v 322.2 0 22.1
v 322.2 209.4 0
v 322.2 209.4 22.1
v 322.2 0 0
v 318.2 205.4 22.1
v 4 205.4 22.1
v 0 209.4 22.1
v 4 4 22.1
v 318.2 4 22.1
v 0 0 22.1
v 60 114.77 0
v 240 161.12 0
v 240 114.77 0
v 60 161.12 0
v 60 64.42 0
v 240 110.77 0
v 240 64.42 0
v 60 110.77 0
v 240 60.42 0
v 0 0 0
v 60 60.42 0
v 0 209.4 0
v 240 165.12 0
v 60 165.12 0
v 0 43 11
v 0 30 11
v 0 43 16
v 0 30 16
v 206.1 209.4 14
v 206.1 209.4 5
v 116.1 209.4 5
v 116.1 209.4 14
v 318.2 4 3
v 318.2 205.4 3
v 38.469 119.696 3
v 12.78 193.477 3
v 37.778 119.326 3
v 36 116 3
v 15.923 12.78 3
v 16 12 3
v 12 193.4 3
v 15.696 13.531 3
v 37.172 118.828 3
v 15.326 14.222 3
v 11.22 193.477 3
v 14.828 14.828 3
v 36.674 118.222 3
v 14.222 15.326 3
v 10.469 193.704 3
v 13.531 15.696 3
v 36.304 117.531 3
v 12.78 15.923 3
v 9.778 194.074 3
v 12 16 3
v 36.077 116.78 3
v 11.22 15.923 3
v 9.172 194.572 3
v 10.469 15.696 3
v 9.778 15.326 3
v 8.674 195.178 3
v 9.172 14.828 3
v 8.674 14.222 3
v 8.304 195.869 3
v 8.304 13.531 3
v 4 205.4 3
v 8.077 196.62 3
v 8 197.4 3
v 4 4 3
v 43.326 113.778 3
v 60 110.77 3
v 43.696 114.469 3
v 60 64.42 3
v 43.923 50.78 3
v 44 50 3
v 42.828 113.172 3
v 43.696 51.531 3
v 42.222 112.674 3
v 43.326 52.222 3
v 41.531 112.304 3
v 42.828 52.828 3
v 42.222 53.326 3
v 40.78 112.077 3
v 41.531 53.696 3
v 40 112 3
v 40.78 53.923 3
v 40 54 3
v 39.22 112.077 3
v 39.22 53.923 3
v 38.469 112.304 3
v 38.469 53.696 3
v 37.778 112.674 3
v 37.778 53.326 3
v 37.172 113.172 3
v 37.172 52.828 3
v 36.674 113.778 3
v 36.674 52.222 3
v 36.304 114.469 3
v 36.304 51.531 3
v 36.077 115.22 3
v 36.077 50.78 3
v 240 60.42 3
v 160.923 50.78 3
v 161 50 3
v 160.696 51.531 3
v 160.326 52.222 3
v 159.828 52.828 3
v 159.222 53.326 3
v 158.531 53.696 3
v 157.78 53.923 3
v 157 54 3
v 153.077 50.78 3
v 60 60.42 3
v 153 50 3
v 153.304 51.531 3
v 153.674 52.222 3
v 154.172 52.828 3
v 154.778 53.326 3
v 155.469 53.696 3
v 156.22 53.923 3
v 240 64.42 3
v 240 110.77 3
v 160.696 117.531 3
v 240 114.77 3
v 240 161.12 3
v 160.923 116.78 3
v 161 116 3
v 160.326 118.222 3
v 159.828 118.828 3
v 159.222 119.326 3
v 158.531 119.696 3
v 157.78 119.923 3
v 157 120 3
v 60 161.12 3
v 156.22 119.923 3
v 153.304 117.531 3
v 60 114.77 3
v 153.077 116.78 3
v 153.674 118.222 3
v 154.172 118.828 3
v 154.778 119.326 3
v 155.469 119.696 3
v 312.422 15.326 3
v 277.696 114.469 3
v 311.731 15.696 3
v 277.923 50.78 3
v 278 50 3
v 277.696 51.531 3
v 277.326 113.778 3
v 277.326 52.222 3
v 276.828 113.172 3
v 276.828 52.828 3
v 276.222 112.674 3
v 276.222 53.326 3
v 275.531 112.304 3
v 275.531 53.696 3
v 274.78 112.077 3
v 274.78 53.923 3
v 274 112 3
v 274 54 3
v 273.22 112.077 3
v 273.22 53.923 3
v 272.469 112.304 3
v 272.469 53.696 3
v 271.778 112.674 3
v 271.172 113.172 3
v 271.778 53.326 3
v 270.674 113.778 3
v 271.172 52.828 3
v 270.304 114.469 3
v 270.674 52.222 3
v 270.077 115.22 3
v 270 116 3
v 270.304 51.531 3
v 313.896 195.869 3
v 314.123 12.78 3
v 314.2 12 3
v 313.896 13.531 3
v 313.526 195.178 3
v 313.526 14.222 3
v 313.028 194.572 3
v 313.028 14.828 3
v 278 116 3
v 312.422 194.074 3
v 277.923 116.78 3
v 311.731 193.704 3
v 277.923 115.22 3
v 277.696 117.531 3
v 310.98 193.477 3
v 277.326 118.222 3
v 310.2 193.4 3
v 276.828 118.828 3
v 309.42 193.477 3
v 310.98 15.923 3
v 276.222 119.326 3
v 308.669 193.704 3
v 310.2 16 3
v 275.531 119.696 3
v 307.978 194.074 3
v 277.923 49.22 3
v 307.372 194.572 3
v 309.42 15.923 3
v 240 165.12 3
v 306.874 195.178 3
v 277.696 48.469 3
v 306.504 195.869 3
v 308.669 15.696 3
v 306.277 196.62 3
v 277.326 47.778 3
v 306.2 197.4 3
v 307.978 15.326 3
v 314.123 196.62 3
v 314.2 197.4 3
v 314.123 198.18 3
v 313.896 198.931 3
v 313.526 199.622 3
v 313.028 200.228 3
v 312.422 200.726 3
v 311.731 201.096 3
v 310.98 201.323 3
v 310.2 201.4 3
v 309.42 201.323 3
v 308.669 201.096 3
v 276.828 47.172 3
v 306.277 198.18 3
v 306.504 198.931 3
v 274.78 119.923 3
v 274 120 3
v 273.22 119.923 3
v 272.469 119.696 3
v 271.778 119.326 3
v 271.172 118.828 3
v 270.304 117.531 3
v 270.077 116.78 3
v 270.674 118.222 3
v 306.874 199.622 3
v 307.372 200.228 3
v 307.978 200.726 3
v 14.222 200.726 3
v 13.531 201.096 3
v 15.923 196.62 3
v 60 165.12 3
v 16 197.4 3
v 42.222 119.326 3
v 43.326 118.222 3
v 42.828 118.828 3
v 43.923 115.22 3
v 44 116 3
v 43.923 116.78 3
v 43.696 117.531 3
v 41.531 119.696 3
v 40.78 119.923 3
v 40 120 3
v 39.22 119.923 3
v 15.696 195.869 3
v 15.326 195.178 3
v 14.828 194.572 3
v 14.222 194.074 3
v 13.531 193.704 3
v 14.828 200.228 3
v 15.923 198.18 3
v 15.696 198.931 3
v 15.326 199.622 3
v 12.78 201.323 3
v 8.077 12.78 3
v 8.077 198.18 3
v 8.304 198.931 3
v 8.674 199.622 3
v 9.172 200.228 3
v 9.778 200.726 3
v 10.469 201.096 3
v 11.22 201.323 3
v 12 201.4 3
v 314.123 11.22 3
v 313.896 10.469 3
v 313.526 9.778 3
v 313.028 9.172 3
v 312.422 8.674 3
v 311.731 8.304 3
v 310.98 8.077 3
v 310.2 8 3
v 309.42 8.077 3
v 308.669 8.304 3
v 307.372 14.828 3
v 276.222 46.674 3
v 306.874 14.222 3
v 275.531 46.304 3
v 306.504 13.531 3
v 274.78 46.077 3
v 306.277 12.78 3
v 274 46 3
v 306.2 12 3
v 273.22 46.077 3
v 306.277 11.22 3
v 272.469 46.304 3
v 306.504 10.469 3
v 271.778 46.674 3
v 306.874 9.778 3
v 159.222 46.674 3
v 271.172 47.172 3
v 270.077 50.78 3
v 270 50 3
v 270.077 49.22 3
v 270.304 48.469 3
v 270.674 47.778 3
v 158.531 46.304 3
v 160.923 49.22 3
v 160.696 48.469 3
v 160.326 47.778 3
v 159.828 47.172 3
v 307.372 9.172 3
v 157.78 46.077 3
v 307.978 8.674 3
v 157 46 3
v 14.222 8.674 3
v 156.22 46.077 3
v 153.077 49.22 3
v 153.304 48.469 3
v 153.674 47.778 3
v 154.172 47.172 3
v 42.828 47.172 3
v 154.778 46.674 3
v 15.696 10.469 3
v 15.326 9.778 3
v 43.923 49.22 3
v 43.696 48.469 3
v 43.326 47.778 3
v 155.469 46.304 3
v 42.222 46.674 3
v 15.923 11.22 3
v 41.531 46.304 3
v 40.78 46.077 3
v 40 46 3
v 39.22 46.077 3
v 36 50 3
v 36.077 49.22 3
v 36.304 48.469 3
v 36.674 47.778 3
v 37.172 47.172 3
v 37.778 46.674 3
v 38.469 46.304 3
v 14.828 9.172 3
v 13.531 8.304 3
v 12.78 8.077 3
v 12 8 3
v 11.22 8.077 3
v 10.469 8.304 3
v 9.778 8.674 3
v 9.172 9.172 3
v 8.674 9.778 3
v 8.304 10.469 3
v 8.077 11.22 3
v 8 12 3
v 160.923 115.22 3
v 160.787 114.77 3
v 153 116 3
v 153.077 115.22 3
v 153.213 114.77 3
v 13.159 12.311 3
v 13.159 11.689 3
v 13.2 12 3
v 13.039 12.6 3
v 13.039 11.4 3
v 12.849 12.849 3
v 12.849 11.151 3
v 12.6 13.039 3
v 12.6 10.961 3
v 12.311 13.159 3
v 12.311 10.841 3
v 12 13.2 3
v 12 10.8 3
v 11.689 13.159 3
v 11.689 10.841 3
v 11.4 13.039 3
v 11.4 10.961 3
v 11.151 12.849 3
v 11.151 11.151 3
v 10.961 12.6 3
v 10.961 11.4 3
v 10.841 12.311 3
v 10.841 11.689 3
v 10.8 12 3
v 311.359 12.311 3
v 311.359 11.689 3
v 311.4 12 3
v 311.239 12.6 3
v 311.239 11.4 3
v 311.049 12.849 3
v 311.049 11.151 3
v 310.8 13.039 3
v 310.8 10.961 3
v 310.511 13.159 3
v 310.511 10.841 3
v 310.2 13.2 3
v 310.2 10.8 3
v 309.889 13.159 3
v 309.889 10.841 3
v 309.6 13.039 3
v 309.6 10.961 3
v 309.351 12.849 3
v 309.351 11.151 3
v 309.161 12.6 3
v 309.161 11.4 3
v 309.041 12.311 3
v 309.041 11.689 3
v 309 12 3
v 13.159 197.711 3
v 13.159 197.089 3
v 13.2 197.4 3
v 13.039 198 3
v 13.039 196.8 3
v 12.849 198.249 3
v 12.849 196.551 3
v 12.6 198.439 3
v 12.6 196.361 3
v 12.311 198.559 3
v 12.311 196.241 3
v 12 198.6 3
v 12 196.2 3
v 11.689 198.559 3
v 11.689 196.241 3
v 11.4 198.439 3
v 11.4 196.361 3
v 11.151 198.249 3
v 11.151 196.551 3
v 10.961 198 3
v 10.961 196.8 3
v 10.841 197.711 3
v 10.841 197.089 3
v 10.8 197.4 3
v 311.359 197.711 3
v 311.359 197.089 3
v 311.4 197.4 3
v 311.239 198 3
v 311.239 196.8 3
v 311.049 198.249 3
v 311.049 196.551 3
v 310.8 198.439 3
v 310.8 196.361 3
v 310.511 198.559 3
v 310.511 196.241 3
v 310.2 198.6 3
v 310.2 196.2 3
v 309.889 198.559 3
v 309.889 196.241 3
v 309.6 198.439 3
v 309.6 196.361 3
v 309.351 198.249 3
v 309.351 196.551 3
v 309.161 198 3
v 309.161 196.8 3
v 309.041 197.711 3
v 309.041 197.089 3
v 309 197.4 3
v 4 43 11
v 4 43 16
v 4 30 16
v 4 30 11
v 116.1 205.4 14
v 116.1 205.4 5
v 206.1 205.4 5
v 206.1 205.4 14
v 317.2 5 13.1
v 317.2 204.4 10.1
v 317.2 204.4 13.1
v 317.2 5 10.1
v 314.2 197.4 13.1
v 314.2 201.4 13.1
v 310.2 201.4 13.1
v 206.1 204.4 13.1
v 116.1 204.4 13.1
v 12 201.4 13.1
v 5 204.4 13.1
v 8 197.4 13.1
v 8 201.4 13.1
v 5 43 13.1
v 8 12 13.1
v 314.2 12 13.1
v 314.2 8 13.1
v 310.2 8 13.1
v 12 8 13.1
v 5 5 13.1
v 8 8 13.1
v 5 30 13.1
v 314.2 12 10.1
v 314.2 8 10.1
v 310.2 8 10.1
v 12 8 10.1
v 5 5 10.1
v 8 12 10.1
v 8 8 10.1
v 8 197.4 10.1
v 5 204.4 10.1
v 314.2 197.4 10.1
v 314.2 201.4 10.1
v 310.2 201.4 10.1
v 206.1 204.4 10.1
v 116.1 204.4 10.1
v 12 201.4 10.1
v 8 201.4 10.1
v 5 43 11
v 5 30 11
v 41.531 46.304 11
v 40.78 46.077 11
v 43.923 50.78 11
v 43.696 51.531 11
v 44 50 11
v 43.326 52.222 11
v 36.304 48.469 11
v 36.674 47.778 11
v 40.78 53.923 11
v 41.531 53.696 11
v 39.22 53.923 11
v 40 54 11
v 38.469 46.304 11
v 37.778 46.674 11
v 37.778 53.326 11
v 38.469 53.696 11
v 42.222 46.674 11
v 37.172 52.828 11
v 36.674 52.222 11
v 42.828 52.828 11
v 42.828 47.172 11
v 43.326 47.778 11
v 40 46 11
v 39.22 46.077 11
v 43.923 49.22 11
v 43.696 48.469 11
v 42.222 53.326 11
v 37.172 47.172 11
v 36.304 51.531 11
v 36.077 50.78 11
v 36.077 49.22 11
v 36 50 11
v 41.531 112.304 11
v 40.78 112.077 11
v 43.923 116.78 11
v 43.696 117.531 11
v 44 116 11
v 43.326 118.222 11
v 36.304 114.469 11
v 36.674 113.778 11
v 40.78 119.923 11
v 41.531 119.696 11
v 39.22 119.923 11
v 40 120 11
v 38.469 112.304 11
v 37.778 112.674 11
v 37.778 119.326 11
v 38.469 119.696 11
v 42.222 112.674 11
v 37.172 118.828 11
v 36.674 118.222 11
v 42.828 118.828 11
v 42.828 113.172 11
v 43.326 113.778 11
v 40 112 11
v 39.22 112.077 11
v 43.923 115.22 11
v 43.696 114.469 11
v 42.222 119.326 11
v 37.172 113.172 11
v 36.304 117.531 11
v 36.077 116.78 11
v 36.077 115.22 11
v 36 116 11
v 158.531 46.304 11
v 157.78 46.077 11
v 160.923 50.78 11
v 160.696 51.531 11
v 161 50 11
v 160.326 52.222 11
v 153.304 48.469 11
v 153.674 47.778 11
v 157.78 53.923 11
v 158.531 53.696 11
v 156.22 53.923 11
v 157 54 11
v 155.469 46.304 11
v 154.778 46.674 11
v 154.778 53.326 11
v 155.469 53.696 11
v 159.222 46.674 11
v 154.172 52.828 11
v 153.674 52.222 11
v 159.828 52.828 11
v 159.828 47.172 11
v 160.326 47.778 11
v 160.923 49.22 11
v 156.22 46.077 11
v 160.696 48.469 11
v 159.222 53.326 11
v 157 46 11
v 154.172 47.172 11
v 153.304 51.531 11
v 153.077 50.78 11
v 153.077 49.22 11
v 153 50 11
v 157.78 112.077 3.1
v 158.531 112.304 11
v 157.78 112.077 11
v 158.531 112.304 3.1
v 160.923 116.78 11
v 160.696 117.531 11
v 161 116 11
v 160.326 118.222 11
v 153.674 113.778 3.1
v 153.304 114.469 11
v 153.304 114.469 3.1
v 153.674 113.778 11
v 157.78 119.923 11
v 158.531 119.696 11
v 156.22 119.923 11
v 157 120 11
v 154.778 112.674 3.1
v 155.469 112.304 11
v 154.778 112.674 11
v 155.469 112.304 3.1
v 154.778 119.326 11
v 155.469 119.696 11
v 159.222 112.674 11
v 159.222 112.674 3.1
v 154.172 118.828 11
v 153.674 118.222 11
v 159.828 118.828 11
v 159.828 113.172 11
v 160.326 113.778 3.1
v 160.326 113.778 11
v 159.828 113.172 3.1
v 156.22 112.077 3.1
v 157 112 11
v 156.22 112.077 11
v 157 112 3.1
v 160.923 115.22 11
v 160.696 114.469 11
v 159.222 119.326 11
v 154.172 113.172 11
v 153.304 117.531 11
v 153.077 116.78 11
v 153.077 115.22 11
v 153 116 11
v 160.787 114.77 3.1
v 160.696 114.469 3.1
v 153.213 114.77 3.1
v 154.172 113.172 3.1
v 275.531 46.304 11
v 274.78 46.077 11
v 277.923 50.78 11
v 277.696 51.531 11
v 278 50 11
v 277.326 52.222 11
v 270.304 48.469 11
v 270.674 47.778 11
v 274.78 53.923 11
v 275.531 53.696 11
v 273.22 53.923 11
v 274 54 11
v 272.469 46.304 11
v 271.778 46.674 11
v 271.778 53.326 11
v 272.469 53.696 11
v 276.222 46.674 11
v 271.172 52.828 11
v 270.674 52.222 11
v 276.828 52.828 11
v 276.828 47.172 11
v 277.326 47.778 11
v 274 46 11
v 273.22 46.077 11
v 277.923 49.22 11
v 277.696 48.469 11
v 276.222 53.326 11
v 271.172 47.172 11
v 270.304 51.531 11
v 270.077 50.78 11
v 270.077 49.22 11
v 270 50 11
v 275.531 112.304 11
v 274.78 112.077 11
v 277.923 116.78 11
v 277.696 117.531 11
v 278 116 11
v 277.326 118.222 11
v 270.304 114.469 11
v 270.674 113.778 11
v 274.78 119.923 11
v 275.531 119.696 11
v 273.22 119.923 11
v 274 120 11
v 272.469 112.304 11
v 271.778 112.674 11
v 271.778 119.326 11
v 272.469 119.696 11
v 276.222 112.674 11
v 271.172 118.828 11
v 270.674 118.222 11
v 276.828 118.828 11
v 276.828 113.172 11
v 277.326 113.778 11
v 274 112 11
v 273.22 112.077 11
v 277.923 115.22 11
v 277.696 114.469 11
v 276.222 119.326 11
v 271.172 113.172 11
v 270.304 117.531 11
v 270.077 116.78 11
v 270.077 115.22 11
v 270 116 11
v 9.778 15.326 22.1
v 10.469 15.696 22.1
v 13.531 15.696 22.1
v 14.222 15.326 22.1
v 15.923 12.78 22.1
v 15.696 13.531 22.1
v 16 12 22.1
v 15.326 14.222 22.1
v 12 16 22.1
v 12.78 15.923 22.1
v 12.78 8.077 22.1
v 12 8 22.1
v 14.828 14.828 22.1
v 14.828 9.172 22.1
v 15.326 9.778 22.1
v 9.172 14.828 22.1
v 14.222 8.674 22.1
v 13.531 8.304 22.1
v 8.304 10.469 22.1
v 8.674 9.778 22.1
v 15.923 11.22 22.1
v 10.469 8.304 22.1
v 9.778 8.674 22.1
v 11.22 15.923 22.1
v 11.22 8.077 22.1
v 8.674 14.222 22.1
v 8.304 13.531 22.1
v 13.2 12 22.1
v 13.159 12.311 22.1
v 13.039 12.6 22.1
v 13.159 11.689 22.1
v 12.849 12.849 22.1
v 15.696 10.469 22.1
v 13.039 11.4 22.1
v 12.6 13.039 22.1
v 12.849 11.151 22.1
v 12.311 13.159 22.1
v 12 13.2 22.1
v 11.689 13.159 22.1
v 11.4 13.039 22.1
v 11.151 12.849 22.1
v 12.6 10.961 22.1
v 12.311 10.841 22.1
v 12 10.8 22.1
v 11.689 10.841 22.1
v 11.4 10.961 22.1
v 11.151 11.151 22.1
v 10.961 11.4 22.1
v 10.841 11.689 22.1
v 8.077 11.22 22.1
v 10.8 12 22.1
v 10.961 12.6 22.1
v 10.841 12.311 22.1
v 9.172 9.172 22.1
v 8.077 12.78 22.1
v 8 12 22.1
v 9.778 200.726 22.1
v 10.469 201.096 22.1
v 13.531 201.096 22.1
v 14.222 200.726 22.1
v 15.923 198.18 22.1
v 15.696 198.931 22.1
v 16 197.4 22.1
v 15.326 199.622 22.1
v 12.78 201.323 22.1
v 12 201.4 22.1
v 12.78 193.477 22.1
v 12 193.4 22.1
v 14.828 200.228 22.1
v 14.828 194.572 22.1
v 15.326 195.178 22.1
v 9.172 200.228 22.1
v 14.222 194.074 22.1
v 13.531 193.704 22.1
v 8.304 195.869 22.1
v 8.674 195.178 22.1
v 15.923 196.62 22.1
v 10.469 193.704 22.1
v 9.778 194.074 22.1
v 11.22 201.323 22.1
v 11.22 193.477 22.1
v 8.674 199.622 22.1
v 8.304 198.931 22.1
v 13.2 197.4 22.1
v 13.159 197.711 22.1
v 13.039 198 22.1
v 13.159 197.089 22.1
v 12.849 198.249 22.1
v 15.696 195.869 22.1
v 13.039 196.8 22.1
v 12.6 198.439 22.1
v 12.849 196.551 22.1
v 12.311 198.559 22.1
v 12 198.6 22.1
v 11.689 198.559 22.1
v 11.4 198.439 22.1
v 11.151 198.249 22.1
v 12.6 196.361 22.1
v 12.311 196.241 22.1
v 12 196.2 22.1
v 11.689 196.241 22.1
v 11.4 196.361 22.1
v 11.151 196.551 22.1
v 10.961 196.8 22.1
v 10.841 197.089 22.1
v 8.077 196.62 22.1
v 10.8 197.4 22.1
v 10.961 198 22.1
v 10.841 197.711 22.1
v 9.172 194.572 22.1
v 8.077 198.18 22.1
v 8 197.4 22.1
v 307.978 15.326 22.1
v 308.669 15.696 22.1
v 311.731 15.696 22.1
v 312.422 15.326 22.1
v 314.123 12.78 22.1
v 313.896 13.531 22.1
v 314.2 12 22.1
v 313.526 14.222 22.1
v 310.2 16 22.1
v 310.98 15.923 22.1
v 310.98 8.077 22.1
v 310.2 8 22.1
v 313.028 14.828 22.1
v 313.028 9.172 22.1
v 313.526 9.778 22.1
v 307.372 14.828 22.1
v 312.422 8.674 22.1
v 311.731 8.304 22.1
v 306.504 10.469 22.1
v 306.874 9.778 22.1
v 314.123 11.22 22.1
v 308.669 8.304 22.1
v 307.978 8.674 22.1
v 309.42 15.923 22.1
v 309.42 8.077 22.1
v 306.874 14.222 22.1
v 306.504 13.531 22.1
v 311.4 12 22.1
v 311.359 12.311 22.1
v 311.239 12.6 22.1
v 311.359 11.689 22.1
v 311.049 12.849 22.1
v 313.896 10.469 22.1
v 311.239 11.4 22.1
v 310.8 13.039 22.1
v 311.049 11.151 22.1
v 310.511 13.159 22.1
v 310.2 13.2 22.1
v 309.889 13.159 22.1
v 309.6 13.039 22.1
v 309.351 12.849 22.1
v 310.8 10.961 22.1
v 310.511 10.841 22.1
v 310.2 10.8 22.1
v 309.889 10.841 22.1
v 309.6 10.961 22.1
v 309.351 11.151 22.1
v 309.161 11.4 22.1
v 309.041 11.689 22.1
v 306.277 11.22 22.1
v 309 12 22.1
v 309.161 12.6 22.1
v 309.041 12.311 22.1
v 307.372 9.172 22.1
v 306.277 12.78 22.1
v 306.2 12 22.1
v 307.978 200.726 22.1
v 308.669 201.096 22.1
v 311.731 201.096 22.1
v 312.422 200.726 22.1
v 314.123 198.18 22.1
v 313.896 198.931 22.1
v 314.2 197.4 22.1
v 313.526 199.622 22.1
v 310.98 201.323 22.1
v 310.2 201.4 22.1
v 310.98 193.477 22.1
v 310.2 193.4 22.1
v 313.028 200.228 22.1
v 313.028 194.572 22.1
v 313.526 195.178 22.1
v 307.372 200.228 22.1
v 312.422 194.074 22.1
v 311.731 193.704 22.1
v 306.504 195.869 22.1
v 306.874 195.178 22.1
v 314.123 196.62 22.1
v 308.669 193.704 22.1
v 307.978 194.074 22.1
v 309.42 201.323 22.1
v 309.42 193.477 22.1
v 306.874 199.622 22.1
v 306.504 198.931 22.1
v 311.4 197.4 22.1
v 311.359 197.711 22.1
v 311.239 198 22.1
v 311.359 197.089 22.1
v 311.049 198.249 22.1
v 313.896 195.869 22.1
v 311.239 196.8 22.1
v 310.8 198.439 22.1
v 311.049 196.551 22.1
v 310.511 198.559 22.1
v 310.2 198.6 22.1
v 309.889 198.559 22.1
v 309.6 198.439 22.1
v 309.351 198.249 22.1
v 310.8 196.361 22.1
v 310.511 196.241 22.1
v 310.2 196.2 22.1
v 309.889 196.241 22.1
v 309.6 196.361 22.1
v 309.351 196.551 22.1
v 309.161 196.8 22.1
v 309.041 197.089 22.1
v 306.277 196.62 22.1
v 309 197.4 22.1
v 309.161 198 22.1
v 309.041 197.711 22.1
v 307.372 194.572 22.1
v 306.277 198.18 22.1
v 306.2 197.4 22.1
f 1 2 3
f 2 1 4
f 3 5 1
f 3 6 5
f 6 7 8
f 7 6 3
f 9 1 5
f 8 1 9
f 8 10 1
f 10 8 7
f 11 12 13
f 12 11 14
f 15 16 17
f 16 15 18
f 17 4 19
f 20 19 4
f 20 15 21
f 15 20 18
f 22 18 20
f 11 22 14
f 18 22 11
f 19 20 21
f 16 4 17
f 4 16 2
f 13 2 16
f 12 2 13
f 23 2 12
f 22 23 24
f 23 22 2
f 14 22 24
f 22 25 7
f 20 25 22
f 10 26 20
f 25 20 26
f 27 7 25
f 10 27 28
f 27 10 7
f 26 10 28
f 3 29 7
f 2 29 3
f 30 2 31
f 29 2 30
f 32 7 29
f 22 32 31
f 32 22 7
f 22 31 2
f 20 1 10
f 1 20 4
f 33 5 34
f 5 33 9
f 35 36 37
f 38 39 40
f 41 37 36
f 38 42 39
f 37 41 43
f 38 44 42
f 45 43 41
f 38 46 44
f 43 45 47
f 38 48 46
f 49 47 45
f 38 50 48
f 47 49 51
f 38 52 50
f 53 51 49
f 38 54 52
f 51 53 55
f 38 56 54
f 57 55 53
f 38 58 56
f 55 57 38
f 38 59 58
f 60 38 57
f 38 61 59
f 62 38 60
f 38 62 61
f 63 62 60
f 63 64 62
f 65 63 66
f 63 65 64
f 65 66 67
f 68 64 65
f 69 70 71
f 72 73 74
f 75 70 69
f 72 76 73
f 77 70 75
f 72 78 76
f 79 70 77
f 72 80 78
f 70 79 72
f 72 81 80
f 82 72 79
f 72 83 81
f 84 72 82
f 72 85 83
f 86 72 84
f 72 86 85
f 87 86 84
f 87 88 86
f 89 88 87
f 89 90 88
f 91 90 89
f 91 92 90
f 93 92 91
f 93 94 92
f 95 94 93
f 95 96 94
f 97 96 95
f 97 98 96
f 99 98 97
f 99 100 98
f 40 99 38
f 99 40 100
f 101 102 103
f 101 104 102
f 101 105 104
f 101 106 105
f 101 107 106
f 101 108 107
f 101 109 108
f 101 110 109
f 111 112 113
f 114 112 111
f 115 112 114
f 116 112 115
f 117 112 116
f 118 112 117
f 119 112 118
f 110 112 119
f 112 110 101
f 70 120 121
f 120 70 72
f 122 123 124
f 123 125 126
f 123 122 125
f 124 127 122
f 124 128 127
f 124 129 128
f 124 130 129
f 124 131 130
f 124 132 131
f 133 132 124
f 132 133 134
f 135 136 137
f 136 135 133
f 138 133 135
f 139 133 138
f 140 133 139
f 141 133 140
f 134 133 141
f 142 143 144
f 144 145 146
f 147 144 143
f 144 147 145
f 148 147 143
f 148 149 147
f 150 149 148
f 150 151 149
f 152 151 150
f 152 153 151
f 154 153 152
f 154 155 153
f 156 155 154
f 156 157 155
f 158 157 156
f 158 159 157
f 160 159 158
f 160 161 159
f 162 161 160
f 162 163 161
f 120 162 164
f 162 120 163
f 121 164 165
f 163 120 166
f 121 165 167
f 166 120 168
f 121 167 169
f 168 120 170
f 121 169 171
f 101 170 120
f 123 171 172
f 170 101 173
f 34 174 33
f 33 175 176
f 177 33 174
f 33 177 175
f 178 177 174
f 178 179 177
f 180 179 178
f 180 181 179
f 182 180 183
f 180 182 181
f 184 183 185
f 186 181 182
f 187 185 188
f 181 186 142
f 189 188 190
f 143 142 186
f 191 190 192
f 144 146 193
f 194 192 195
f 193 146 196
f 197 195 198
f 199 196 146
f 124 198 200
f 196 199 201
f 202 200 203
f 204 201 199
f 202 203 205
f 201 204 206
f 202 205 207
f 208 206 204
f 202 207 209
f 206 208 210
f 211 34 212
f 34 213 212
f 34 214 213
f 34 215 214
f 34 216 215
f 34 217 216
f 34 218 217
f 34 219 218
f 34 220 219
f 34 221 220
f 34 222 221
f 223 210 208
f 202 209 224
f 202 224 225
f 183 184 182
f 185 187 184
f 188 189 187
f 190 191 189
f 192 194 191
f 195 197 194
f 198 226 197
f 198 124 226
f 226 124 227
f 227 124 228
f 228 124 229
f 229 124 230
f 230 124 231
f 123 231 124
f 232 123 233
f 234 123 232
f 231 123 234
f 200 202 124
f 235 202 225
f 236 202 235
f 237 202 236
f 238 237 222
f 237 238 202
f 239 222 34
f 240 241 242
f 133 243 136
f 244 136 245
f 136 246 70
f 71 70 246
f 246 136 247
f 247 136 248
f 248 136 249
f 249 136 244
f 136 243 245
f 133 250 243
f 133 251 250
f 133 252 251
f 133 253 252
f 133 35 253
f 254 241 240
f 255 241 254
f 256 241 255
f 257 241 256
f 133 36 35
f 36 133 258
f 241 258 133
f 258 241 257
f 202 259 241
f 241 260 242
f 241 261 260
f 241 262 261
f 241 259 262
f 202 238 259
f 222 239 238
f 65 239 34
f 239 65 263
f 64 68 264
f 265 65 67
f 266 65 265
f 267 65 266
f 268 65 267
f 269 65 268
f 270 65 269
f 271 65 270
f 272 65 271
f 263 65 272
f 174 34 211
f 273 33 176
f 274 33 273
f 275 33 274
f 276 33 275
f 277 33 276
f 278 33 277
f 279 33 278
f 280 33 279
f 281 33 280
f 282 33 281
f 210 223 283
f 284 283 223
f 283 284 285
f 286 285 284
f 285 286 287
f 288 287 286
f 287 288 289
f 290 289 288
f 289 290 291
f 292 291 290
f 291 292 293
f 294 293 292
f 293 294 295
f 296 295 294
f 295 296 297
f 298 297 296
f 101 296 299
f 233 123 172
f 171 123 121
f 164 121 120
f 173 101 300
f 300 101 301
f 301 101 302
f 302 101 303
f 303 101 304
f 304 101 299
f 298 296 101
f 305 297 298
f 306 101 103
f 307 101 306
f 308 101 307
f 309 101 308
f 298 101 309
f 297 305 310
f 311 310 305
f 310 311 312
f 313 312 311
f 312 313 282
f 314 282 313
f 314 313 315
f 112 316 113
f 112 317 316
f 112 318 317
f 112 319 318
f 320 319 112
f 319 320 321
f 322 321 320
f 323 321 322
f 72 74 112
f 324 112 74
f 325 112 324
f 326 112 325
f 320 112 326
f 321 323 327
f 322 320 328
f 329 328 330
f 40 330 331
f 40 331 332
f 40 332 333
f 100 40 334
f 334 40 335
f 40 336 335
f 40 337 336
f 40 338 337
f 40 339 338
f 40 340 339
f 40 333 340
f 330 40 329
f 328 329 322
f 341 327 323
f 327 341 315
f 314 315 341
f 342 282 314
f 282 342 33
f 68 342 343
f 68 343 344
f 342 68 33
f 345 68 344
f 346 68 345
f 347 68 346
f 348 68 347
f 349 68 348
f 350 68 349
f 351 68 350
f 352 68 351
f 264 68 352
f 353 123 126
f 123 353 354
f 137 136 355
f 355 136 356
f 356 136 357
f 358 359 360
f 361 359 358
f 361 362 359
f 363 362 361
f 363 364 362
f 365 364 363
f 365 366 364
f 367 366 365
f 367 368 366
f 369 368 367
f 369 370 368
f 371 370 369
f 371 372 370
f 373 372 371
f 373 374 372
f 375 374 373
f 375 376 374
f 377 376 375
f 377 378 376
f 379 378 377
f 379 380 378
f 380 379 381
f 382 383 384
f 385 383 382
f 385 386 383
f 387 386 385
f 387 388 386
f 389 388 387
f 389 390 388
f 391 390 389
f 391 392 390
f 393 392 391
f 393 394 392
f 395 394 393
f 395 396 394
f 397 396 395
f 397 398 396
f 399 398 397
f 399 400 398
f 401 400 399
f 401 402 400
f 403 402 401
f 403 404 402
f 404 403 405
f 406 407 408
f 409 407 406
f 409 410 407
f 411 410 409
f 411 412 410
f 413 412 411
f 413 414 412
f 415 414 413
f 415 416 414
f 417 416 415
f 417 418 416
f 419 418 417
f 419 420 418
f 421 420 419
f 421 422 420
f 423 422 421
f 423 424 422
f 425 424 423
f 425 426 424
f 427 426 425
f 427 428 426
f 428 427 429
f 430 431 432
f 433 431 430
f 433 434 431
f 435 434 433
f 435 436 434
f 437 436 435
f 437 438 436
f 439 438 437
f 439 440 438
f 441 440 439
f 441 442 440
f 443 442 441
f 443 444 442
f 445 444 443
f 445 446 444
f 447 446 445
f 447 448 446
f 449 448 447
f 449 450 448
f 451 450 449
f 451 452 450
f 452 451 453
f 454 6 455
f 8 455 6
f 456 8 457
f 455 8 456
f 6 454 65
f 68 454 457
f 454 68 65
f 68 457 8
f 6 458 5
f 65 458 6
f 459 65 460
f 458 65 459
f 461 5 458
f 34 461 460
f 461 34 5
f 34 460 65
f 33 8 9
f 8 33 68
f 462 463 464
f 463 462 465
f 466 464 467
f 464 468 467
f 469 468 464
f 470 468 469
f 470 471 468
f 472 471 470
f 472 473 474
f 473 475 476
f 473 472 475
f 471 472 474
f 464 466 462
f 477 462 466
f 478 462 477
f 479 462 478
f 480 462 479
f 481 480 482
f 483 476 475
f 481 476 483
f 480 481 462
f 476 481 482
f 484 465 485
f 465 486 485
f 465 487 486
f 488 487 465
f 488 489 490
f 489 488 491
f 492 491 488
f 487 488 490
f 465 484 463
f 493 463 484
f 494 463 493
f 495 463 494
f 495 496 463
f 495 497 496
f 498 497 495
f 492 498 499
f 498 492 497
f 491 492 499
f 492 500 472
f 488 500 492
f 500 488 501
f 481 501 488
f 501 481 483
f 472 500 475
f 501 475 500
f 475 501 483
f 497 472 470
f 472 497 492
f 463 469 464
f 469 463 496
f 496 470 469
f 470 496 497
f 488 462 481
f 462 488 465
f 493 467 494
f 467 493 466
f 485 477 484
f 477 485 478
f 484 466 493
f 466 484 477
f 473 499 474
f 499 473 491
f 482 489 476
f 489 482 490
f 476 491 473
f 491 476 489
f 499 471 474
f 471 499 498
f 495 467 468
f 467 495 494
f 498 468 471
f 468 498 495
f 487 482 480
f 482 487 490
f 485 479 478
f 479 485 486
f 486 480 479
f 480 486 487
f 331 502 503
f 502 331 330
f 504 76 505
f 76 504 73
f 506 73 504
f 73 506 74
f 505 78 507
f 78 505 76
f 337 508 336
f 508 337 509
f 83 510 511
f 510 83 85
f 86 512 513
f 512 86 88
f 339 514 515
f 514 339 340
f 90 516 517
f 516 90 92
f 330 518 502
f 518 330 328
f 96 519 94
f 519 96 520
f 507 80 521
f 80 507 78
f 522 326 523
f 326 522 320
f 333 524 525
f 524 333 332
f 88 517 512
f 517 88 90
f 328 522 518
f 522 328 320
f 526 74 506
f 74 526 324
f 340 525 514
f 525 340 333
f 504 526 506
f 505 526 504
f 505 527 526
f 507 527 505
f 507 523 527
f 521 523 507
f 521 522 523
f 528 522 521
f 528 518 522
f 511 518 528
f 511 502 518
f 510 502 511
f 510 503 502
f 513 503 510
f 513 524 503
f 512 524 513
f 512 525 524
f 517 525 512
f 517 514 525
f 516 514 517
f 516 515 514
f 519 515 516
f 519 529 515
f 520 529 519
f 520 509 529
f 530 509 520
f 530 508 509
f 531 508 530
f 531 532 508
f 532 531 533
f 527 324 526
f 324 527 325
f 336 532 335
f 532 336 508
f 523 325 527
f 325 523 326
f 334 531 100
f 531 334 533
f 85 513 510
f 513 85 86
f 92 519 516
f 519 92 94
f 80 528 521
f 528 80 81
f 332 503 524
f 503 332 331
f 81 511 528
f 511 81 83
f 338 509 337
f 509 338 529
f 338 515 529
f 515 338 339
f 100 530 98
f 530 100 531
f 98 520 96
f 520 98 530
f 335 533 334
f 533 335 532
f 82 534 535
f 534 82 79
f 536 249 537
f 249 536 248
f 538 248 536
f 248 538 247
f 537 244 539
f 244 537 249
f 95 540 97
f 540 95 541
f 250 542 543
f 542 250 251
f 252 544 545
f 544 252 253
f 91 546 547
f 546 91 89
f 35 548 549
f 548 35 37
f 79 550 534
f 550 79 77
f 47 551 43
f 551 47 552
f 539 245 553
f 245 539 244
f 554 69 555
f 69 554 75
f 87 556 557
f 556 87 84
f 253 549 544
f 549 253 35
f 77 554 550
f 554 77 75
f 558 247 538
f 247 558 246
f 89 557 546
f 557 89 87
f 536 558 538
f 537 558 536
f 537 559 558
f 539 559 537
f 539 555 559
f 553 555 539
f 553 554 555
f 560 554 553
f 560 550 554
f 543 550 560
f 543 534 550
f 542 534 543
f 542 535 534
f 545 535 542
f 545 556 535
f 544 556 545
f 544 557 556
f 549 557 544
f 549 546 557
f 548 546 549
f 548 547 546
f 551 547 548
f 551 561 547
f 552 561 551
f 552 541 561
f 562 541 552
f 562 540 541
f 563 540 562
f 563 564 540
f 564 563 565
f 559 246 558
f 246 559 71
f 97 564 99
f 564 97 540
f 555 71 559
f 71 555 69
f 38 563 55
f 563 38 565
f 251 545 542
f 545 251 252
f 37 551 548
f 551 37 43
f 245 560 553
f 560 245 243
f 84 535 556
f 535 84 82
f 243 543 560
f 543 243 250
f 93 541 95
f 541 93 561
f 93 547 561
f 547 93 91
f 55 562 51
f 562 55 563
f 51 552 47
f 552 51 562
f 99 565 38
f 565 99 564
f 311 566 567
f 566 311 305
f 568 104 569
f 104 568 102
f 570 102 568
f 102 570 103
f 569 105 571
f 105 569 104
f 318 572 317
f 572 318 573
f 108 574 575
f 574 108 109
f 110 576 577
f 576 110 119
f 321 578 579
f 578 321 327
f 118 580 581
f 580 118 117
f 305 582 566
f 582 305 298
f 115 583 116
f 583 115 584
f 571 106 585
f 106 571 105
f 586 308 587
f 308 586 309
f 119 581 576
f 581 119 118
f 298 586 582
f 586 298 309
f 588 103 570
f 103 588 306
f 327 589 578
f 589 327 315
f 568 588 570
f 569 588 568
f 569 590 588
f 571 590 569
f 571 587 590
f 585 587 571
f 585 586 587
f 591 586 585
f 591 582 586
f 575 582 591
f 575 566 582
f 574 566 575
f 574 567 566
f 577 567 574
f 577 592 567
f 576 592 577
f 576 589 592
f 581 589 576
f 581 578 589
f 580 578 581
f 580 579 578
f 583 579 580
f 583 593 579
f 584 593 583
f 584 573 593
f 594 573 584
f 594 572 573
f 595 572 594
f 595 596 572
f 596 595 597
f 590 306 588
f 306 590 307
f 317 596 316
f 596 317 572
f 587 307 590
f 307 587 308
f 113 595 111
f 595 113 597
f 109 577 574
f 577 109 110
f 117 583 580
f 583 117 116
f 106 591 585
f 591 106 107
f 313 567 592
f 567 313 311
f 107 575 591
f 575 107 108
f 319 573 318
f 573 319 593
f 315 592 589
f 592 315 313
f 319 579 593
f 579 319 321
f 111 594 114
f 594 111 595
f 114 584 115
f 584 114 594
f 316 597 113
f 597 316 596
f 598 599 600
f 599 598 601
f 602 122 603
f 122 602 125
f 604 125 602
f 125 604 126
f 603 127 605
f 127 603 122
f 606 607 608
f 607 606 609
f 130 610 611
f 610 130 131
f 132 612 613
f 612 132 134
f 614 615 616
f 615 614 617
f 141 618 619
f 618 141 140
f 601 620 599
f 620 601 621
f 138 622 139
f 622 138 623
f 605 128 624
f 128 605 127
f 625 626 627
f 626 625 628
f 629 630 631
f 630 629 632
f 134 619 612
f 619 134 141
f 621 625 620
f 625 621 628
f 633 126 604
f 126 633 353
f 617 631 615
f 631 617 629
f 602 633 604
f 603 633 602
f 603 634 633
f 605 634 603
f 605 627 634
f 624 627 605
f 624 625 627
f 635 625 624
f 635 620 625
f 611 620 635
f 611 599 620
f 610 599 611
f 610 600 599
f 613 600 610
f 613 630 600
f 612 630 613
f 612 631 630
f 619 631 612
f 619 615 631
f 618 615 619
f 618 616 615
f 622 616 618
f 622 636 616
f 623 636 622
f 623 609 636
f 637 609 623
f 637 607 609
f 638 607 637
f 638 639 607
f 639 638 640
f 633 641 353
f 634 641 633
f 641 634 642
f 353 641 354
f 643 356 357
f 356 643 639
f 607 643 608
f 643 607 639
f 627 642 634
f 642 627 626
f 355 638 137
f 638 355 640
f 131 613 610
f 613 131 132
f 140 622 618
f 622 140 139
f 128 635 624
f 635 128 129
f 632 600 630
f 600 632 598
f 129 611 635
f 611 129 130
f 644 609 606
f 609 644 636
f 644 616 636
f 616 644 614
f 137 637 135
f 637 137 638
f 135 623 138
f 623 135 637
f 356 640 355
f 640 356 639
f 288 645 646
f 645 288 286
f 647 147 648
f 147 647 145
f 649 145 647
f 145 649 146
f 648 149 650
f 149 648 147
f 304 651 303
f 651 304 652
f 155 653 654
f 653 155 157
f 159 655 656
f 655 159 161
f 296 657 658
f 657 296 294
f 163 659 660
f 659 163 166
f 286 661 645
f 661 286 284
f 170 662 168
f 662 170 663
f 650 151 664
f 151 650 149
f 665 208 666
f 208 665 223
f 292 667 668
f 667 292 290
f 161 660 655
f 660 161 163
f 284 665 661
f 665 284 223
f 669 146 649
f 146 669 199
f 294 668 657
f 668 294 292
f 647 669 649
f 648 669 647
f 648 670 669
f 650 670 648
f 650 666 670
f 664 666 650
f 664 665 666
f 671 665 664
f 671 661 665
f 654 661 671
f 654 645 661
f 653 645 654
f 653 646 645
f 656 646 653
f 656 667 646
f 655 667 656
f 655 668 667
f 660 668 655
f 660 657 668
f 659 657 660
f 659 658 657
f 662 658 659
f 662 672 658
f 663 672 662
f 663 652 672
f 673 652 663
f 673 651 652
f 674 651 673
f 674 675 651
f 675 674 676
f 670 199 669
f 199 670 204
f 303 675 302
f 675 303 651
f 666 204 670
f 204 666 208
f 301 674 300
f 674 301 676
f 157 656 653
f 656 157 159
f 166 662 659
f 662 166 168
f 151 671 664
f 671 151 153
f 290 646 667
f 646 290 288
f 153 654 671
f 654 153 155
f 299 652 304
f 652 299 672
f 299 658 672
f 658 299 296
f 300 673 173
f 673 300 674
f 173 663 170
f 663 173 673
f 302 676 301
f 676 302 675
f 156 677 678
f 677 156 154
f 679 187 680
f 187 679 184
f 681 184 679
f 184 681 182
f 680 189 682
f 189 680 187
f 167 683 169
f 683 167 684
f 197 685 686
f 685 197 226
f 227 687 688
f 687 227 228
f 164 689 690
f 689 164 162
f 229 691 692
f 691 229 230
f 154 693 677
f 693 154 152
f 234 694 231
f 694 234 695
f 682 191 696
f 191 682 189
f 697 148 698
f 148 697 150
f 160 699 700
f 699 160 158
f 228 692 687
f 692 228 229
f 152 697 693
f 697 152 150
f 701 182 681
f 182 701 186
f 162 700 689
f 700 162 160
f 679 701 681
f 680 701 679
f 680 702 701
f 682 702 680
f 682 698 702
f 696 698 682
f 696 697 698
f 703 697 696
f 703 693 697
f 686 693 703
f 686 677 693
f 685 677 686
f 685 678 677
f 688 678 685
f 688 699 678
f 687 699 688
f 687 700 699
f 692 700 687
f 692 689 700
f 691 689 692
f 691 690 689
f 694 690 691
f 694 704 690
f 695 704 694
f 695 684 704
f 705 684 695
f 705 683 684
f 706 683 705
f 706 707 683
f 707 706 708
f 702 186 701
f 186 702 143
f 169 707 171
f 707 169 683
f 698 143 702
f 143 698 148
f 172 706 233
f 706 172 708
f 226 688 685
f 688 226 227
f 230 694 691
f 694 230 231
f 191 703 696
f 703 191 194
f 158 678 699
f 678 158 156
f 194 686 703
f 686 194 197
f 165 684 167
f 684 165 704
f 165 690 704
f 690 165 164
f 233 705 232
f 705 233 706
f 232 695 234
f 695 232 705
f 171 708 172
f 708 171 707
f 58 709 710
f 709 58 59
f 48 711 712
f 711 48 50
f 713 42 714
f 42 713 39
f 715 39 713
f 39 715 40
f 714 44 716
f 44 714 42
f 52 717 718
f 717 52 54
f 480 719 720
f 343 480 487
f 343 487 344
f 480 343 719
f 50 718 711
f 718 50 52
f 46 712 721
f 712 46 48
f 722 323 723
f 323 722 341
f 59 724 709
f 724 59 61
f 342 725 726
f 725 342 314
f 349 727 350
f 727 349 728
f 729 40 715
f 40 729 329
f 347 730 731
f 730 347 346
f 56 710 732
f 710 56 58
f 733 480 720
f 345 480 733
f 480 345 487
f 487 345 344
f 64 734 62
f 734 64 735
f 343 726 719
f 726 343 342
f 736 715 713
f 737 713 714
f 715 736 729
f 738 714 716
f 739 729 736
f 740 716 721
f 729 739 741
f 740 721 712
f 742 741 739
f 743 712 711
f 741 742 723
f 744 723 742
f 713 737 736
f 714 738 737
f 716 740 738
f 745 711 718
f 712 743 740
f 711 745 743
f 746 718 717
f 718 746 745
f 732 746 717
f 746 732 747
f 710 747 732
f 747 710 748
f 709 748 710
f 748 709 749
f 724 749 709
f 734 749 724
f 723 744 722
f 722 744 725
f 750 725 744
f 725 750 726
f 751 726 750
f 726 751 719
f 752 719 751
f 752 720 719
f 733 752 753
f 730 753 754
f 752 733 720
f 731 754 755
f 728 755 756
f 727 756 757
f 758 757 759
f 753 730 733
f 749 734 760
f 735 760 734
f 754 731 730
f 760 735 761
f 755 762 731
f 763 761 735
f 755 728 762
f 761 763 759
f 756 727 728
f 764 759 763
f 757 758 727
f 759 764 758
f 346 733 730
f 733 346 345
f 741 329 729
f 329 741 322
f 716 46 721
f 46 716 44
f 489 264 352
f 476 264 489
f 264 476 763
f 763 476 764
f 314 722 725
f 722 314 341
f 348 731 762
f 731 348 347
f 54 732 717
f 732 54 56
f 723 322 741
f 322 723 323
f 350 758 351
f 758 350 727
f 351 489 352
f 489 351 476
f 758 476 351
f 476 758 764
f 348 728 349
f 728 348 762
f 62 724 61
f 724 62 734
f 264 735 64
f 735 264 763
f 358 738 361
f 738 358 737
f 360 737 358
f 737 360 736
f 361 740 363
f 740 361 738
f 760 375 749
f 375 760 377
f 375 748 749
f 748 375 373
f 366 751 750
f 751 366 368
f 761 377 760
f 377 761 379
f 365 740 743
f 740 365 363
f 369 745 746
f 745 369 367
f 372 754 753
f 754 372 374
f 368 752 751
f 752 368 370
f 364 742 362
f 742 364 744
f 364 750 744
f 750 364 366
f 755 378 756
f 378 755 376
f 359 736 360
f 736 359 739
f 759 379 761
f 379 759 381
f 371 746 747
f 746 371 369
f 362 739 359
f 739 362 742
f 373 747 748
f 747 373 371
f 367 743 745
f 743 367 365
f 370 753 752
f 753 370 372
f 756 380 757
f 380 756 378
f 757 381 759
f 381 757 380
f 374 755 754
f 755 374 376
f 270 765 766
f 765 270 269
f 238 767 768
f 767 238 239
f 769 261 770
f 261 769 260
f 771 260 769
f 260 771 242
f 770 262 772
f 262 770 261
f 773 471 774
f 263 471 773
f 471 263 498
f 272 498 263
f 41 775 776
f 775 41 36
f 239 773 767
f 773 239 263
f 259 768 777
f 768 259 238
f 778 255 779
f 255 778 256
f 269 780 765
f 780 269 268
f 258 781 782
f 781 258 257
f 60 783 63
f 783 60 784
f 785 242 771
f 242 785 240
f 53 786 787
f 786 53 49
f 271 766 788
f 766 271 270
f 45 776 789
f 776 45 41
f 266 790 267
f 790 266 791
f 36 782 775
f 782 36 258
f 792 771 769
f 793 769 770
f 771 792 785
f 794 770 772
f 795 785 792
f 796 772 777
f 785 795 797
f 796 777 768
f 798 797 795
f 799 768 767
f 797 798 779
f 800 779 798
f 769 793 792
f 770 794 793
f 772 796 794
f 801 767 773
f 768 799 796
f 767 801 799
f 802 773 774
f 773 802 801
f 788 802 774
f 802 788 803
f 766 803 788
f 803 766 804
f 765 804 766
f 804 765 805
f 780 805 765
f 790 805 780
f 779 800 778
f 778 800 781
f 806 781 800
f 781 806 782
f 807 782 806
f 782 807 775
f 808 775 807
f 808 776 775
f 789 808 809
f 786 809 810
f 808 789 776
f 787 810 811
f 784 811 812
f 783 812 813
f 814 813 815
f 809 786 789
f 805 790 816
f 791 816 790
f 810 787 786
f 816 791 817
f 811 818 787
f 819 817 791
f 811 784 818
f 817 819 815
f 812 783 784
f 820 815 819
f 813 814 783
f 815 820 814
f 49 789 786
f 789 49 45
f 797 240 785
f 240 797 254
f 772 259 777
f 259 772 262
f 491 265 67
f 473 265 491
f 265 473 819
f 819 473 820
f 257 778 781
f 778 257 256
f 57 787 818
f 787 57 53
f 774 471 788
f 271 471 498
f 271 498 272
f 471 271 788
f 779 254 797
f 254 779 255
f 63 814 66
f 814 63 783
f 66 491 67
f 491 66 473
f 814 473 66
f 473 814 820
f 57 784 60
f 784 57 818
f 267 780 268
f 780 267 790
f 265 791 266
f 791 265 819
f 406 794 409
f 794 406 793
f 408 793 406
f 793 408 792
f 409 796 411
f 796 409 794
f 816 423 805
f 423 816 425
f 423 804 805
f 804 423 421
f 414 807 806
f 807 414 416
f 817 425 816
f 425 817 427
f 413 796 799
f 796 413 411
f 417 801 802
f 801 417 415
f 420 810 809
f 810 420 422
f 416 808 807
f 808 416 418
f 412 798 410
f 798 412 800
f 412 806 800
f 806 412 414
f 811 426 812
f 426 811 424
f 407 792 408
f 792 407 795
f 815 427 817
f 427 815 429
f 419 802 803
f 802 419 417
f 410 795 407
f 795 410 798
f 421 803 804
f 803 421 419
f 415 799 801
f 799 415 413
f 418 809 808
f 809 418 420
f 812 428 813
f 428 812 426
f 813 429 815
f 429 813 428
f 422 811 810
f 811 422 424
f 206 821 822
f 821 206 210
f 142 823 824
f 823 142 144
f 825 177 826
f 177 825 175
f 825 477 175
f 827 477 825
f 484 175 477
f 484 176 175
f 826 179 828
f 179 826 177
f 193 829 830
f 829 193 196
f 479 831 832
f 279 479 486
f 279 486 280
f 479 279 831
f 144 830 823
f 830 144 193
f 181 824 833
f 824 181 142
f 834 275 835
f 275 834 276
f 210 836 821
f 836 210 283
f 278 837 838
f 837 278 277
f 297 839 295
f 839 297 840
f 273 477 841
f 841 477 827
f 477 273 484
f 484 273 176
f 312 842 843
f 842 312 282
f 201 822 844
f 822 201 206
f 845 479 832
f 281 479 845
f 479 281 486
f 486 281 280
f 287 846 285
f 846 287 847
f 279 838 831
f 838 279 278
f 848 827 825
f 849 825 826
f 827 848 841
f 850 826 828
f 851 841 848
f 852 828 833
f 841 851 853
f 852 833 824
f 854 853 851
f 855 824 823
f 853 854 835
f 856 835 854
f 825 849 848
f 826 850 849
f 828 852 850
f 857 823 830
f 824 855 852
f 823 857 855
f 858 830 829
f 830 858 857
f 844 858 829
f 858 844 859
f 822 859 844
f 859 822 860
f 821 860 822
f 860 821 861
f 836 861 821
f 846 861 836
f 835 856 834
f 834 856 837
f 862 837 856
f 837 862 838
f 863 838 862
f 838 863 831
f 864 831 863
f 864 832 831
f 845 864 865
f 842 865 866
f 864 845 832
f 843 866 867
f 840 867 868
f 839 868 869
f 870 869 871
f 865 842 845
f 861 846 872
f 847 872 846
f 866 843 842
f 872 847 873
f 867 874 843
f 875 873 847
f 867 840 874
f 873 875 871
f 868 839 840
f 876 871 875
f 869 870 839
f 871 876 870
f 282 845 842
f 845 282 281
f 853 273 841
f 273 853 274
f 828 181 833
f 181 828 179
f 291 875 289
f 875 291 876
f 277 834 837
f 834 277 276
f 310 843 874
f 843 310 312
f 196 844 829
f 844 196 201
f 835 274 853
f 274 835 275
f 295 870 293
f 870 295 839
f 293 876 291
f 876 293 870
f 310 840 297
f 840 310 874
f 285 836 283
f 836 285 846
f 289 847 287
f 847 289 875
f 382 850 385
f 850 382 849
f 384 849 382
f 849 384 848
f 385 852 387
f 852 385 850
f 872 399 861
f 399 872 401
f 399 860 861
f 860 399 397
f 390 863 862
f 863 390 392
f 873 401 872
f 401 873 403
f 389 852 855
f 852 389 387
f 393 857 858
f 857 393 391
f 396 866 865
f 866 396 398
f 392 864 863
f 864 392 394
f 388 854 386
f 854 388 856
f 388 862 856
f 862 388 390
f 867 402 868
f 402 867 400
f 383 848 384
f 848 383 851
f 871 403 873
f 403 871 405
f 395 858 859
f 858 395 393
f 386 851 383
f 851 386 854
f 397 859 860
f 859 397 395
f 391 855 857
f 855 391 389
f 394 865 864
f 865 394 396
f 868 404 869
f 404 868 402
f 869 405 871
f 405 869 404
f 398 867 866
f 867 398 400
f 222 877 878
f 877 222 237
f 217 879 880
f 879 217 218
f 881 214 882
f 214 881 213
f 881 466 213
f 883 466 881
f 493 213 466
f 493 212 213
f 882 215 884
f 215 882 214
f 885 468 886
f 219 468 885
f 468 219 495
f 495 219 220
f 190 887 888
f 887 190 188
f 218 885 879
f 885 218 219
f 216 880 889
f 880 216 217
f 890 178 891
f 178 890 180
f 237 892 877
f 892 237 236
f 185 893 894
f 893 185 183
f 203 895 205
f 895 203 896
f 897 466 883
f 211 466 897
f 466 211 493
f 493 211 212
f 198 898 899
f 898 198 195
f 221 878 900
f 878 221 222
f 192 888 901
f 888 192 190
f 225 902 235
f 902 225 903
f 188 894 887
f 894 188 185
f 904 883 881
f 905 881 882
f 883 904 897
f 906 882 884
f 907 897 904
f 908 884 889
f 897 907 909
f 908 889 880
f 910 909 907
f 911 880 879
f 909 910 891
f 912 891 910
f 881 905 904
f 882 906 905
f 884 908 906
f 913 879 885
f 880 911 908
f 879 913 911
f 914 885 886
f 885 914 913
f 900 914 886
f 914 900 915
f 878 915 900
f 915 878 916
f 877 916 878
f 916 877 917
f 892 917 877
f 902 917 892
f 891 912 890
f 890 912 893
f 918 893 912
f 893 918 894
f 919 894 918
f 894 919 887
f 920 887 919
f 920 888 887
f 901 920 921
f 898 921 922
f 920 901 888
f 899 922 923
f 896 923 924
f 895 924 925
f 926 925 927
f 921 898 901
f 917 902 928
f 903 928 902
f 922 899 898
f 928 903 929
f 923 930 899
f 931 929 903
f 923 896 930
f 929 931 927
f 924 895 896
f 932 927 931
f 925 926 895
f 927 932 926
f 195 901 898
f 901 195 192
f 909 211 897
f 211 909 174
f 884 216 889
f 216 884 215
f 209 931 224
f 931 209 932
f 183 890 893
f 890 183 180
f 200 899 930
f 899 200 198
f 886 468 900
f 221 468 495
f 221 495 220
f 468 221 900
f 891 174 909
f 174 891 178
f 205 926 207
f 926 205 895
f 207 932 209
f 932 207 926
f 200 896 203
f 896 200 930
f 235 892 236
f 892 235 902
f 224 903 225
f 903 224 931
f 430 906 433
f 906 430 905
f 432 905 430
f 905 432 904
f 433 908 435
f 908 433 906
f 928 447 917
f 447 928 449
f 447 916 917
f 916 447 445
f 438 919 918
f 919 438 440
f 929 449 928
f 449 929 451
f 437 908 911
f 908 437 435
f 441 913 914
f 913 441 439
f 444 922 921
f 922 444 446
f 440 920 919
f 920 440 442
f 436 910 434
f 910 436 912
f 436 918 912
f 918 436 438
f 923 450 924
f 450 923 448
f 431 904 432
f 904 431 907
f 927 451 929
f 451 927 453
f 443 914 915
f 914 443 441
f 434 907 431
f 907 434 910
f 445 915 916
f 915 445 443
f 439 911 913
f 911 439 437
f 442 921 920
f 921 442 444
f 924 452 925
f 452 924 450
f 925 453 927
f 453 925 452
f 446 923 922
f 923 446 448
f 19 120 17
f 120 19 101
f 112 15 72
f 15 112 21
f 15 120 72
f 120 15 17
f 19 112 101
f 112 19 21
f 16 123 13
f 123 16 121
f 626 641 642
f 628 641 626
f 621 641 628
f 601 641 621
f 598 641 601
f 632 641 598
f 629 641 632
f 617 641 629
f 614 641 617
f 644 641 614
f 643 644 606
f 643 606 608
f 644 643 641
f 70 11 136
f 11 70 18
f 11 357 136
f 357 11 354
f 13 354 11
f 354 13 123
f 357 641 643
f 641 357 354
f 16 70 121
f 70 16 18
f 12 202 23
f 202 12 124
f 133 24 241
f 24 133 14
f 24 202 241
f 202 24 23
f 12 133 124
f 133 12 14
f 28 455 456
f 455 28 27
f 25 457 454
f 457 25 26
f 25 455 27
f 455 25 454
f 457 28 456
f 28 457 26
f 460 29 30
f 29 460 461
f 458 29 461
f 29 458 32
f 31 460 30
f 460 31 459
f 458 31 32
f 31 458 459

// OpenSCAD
// ============================================================
// 底壳 v3.1 · 层高终版（2026-10-02 磁路注释随 v5.0 侧磁方案更新；几何不变）
// 层链（自上而下）：
//   厚板 9mm（盲孔板，键帽块在其中滑动；块底与板底平齐）
//     ↕ 悬浮气隙 4mm（静止）→ 1mm（按到底）——键帽间侧壁互斥回弹，板侧无磁铁
//   屏 2.5mm + 空气隙 2mm → PCB 1.6mm → 底壳
// 磁距（v5.0 口径）：键帽侧磁铁(块内磁心高 1.05) → 霍尔(贴 PCB 面)
//   ≈ 8.5mm（静止）→ 5.5mm（按下）；霍尔位于每键左侧磁铁正下方（CSV v5.0）
// 壳体：四壁高 = 厚板9 + 屏悬链8.6 + 底板3 → 总高约 34.6（与 v1.6 相同，已验算）
// ============================================================

part = "chassis"; // ["chassis","chassis_section"]

plate_w = 314.2; plate_d = 201.4; plate_t = 9.0;
screen_t = 2.5;  air = 2.0;  pcb_t = 1.6;
base_t = 3.0;    wall_t = 4.0;
// 层链：厚板坐于托圈（托圈面=屏顶上方0=直接贴屏？不——厚板底需离屏面留键帽块悬浮空间
// ★ 关键：键帽块底面=厚板底面下方0（块底与板底平齐），块底→屏面间隙 = 悬浮4mm
//   → 厚板底面距屏面 = 4mm（此间隙由四壁内侧的"厚板托肩"承托控制）
shoulder_h = 4.0;                 // 托肩面距屏面 = 悬浮行程空间
ledge_z = base_t + pcb_t + air + screen_t + shoulder_h;  // 厚板底面高度 = 19.6（同v1.6，巧）
wall_h  = ledge_z + plate_t;      // 34.6 → 与 v1.6 完全一致（总高不变验证 ✓）
inner_w = plate_w - 2*wall_t + 2*2;   // 厚板嵌入内腔（左右各卡入2mm）
inner_d = plate_d - 2*wall_t + 2*2;

module chassis() {
  difference() {
    union() {
      // 外壁
      difference() {
        cube([plate_w+2*wall_t, plate_d+2*wall_t, wall_h]);
        translate([wall_t, wall_t, base_t])
          cube([plate_w, plate_d, wall_h-base_t]);
      }
      // 屏托圈（托厚板：搭接2mm/边，承托面=ledge_z）
      translate([wall_t+1, wall_t+1, ledge_z-3])
        difference() {
          cube([plate_w-2, plate_d-2, 3]);
          translate([3,3,-0.1]) cube([plate_w-8, plate_d-8, 3.2]);
        }
      // PCB 支撑柱 ×6
      for (px=[40, 157, 274], py=[50, 116])
        translate([px, py, base_t]) cylinder(d=8, h=8, $fn=32);
      // 四角螺钉柱
      for (x=[12, plate_w+wall_t*2-12], y=[12, plate_d+wall_t*2-12])
        translate([x, y, base_t]) difference() {
          cylinder(d=8, h=wall_h-base_t, $fn=32);
          translate([0,0,-1]) cylinder(d=2.4, h=wall_h, $fn=24);
        }
    }
    // USB-C 左墙口（PCB 前段）
    translate([-1, 30, base_t+8]) cube([wall_t+2, 13, 5]);
    // 背墙出线口（HDMI/12V）
    translate([plate_w/2+wall_t-45, plate_d+wall_t-1, base_t+2])
      cube([90, wall_t+2, 9]);
    // 底面散热缝×3
    for (yy=[plate_d*0.3, plate_d*0.55, plate_d*0.8])
      translate([60, yy, -0.1]) cube([180, 4, base_t+0.2]);
  }
}
chassis();
